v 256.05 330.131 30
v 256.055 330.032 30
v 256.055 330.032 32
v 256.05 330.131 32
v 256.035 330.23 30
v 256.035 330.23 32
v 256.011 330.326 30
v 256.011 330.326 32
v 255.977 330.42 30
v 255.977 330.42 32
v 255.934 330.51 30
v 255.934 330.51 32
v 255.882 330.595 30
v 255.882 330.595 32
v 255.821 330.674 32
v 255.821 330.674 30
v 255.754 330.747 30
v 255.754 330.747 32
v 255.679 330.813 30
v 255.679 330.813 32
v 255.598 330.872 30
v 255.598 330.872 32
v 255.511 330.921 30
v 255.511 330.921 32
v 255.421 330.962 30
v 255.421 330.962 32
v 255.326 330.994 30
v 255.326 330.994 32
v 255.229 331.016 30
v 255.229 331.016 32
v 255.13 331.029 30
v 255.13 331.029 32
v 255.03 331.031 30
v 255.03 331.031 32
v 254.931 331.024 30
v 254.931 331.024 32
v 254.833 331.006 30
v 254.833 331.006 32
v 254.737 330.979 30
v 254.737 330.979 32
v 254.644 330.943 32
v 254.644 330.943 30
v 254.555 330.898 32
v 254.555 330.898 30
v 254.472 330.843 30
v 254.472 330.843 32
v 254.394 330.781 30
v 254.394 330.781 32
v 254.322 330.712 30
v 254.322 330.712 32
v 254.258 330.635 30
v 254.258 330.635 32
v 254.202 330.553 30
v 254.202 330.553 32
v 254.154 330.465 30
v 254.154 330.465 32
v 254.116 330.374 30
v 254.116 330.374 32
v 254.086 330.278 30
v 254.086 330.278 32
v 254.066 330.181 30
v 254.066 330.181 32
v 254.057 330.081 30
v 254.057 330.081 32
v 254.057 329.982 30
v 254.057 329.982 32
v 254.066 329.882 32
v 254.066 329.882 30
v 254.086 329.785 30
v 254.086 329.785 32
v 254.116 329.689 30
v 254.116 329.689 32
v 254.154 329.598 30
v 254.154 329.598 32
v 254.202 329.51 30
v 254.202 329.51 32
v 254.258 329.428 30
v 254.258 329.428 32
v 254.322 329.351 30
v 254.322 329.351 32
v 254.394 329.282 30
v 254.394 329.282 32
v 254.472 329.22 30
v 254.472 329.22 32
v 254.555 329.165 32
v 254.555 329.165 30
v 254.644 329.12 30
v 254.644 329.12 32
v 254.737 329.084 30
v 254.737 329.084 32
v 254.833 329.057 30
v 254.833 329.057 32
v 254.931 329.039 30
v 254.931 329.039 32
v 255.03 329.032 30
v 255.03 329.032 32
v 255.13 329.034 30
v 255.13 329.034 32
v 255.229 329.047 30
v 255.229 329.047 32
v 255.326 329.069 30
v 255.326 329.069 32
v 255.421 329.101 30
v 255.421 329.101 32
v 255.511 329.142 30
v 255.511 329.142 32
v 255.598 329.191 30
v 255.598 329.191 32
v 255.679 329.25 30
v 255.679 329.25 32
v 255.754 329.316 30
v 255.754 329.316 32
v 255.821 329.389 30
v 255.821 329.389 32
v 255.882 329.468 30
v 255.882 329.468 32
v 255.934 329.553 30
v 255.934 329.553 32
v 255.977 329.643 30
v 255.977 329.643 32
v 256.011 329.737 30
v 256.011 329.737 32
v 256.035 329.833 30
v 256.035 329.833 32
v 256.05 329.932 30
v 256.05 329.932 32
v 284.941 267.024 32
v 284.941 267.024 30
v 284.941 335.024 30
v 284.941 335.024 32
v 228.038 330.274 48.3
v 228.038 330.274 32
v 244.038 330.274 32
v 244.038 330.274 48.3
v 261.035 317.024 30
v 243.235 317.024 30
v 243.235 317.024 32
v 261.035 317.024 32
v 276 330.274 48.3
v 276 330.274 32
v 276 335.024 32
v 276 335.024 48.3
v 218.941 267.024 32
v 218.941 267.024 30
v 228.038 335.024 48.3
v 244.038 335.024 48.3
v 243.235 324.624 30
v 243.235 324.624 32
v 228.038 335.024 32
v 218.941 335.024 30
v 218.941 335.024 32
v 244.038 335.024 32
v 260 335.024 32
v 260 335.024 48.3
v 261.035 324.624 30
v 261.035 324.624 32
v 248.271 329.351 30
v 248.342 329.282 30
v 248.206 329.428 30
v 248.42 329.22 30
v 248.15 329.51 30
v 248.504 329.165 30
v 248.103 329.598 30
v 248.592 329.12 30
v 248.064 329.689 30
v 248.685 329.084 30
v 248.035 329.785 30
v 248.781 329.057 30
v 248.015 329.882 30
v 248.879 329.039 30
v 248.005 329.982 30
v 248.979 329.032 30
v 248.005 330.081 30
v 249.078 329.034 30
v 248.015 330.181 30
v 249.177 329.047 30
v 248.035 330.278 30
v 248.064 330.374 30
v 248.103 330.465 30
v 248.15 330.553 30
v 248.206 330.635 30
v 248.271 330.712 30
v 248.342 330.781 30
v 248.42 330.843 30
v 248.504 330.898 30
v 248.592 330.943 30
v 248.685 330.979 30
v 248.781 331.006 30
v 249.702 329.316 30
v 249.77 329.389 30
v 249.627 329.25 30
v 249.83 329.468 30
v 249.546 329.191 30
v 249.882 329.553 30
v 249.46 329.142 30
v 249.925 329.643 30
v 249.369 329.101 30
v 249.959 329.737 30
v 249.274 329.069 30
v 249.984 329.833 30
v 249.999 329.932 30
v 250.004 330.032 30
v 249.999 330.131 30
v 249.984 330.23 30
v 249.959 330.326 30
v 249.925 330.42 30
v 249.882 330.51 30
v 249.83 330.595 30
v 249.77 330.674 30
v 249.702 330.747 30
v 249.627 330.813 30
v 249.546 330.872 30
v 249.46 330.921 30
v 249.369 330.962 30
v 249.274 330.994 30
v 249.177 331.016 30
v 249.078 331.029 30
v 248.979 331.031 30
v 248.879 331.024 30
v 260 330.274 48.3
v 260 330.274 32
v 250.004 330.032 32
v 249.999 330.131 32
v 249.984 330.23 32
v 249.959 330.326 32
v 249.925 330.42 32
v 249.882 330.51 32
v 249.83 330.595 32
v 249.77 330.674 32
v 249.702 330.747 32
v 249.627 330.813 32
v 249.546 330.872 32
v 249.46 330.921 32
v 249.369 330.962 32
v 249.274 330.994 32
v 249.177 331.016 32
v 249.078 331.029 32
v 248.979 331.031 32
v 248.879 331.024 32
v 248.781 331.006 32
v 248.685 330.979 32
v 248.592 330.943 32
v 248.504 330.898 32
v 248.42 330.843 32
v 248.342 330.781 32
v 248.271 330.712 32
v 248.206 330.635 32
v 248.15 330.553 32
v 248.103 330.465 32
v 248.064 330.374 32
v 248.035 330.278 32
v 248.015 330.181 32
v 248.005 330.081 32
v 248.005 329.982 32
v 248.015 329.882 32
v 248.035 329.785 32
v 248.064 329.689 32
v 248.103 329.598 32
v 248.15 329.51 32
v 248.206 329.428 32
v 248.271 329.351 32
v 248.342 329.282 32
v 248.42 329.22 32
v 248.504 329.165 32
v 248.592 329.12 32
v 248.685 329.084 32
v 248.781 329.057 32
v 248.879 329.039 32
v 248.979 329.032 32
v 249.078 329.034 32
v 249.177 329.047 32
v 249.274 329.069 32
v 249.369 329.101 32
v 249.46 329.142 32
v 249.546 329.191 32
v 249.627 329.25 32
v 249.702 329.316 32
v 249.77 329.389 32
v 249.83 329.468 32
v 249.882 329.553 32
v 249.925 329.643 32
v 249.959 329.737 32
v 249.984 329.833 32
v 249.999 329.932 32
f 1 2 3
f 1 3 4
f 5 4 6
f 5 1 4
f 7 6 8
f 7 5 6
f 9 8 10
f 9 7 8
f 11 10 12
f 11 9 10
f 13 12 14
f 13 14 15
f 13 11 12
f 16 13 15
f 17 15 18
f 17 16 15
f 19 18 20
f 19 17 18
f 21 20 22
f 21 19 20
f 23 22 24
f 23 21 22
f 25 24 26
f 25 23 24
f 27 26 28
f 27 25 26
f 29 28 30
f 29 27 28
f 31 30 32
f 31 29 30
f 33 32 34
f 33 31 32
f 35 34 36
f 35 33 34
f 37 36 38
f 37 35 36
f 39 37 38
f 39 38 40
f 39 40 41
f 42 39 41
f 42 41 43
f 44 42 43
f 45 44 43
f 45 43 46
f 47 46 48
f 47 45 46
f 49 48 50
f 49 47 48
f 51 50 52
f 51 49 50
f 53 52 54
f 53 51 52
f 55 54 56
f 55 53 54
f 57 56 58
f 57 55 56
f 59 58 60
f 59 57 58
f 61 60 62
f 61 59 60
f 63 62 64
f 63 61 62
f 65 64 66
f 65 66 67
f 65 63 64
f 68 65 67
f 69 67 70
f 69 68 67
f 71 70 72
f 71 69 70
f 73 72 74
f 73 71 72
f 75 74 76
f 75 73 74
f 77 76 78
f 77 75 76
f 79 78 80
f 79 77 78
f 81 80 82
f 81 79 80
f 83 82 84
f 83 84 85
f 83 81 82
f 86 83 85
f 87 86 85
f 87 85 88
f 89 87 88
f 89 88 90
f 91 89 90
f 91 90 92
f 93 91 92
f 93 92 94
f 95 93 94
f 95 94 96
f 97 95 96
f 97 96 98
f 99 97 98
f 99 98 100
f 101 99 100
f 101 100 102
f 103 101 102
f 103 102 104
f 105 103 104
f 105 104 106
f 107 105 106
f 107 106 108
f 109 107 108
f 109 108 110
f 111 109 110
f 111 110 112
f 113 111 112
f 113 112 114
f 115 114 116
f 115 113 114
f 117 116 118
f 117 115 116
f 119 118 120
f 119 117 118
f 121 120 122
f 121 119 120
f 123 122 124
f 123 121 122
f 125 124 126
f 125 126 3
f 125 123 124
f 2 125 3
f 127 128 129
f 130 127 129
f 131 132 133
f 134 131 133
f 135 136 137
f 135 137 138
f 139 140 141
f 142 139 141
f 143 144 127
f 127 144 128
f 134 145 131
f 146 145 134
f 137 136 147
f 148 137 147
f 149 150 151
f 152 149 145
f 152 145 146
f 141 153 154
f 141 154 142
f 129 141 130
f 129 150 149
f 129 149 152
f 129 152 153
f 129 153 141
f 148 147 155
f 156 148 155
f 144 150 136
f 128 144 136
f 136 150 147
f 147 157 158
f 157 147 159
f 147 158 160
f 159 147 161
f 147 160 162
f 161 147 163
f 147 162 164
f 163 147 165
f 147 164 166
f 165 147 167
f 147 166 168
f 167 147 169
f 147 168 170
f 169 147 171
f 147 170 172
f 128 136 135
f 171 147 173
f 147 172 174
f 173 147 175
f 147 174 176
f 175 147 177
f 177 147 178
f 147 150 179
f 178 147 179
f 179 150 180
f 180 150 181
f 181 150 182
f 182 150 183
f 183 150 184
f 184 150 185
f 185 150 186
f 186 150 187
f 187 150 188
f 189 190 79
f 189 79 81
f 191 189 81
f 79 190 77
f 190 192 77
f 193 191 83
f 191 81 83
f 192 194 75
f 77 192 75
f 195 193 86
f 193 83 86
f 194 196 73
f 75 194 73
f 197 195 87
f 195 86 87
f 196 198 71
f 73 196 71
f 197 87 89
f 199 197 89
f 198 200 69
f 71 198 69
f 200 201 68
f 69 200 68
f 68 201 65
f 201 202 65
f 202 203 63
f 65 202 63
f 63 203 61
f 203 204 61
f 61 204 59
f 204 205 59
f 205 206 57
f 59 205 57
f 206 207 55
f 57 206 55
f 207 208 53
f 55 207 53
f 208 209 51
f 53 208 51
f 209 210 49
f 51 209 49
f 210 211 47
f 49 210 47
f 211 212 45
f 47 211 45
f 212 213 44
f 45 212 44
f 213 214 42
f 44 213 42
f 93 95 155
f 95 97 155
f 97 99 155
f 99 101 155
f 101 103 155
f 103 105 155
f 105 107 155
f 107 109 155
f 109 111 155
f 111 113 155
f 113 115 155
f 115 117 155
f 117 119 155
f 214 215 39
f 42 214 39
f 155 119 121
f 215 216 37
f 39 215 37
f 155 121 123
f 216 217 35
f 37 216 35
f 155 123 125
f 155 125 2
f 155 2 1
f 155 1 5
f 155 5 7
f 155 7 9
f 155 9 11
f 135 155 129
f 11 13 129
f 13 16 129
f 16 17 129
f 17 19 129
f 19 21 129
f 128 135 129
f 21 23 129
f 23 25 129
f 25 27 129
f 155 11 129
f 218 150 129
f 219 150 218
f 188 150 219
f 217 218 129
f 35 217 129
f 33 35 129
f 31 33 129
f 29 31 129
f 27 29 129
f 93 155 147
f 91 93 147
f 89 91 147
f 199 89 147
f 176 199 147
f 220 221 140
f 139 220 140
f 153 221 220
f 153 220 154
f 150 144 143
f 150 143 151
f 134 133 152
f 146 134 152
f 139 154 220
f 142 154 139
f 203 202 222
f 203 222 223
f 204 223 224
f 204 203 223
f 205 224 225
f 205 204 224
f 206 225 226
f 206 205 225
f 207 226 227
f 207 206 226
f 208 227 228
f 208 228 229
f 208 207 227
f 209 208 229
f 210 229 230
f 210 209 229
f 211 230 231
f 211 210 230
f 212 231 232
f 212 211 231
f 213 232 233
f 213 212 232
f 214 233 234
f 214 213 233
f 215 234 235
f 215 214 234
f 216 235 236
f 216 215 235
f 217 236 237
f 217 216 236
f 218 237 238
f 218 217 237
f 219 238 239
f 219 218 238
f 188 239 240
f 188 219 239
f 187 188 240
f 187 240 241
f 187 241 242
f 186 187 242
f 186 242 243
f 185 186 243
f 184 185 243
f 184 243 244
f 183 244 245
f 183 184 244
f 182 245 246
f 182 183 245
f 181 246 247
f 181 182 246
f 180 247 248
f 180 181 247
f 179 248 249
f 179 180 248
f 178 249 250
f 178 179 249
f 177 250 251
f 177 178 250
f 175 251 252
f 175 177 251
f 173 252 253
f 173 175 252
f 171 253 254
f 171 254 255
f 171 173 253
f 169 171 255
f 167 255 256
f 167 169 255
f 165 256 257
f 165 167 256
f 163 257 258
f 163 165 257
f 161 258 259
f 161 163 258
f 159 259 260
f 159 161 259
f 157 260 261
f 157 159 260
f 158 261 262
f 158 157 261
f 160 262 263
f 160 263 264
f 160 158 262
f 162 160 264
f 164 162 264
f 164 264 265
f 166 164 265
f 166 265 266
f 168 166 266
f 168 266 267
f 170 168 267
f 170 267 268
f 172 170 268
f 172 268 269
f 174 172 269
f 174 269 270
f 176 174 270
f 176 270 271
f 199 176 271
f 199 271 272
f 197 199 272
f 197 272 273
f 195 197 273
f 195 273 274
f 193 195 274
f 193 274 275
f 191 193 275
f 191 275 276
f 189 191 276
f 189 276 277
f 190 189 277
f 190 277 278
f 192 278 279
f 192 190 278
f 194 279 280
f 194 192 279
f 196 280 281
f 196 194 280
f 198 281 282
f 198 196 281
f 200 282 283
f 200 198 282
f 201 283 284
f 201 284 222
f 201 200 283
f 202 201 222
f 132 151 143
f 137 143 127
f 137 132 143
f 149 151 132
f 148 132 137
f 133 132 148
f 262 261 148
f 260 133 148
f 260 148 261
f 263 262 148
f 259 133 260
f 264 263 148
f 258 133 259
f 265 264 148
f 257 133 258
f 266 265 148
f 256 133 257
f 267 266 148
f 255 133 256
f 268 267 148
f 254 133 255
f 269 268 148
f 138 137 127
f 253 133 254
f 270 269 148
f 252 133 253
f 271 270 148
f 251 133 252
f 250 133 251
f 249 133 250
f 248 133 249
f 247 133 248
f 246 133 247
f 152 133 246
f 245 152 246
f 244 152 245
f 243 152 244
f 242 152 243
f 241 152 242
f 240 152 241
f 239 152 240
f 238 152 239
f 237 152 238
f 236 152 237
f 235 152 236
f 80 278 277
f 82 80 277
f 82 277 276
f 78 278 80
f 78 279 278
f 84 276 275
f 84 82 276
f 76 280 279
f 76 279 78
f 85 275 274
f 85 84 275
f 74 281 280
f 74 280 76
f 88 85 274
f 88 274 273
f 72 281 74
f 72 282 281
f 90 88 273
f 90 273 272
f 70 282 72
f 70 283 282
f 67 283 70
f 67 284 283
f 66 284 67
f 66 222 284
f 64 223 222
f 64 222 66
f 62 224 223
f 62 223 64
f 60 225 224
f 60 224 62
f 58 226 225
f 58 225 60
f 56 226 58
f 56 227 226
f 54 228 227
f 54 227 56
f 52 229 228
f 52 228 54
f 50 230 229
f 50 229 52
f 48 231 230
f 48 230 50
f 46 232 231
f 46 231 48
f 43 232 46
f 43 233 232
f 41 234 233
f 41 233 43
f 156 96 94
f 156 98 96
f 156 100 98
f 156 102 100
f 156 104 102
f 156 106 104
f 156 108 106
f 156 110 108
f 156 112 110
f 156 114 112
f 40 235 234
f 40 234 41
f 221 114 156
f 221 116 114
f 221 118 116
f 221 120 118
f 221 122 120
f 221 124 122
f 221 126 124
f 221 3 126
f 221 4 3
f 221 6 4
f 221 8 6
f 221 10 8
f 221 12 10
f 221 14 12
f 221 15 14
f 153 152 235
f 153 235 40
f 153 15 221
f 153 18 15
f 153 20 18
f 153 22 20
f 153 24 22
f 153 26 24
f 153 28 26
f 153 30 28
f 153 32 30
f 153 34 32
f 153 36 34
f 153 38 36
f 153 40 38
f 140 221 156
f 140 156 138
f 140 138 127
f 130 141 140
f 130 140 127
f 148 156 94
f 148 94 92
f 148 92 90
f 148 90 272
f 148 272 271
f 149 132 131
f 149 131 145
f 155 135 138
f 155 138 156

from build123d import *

# Parameters (mm, degrees)
SKETCH1_W           = 66
SKETCH1_H           = 68
SKETCH1_R           = 1
SKETCH1_W_2         = 17.8
SKETCH1_H_2         = 7.6
BOSS_EXTRUDE1_DEPTH = 2
SKETCH2_W           = 16
SKETCH2_H           = 4.75
BOSS_EXTRUDE2_DEPTH = 16.3


with BuildPart() as part:
    # Sketch1 → Boss-Extrude1 (new body)
    with BuildSketch(Plane.XY.offset(30)):
        with Locations((251.940861289, 301.024014524)):
            Rectangle(SKETCH1_W, SKETCH1_H)
        with Locations((249.003592831, 330.031505481)):
            Circle(SKETCH1_R, mode=Mode.SUBTRACT)
        with Locations((255.055282531, 330.031505481)):
            Circle(SKETCH1_R, mode=Mode.SUBTRACT)
        with Locations((252.135035756, 320.823888471)):
            Rectangle(SKETCH1_W_2, SKETCH1_H_2, mode=Mode.SUBTRACT)
    extrude(amount=BOSS_EXTRUDE1_DEPTH)

    # Sketch2 → Boss-Extrude2 (add)
    with BuildSketch(Plane.XY.offset(32)):
        with Locations((236.037971242, 332.649014524)):
            Rectangle(SKETCH2_W, SKETCH2_H)
        with Locations((268, 332.649014524)):
            Rectangle(SKETCH2_W, SKETCH2_H)
    extrude(amount=BOSS_EXTRUDE2_DEPTH)


solid = part.part
